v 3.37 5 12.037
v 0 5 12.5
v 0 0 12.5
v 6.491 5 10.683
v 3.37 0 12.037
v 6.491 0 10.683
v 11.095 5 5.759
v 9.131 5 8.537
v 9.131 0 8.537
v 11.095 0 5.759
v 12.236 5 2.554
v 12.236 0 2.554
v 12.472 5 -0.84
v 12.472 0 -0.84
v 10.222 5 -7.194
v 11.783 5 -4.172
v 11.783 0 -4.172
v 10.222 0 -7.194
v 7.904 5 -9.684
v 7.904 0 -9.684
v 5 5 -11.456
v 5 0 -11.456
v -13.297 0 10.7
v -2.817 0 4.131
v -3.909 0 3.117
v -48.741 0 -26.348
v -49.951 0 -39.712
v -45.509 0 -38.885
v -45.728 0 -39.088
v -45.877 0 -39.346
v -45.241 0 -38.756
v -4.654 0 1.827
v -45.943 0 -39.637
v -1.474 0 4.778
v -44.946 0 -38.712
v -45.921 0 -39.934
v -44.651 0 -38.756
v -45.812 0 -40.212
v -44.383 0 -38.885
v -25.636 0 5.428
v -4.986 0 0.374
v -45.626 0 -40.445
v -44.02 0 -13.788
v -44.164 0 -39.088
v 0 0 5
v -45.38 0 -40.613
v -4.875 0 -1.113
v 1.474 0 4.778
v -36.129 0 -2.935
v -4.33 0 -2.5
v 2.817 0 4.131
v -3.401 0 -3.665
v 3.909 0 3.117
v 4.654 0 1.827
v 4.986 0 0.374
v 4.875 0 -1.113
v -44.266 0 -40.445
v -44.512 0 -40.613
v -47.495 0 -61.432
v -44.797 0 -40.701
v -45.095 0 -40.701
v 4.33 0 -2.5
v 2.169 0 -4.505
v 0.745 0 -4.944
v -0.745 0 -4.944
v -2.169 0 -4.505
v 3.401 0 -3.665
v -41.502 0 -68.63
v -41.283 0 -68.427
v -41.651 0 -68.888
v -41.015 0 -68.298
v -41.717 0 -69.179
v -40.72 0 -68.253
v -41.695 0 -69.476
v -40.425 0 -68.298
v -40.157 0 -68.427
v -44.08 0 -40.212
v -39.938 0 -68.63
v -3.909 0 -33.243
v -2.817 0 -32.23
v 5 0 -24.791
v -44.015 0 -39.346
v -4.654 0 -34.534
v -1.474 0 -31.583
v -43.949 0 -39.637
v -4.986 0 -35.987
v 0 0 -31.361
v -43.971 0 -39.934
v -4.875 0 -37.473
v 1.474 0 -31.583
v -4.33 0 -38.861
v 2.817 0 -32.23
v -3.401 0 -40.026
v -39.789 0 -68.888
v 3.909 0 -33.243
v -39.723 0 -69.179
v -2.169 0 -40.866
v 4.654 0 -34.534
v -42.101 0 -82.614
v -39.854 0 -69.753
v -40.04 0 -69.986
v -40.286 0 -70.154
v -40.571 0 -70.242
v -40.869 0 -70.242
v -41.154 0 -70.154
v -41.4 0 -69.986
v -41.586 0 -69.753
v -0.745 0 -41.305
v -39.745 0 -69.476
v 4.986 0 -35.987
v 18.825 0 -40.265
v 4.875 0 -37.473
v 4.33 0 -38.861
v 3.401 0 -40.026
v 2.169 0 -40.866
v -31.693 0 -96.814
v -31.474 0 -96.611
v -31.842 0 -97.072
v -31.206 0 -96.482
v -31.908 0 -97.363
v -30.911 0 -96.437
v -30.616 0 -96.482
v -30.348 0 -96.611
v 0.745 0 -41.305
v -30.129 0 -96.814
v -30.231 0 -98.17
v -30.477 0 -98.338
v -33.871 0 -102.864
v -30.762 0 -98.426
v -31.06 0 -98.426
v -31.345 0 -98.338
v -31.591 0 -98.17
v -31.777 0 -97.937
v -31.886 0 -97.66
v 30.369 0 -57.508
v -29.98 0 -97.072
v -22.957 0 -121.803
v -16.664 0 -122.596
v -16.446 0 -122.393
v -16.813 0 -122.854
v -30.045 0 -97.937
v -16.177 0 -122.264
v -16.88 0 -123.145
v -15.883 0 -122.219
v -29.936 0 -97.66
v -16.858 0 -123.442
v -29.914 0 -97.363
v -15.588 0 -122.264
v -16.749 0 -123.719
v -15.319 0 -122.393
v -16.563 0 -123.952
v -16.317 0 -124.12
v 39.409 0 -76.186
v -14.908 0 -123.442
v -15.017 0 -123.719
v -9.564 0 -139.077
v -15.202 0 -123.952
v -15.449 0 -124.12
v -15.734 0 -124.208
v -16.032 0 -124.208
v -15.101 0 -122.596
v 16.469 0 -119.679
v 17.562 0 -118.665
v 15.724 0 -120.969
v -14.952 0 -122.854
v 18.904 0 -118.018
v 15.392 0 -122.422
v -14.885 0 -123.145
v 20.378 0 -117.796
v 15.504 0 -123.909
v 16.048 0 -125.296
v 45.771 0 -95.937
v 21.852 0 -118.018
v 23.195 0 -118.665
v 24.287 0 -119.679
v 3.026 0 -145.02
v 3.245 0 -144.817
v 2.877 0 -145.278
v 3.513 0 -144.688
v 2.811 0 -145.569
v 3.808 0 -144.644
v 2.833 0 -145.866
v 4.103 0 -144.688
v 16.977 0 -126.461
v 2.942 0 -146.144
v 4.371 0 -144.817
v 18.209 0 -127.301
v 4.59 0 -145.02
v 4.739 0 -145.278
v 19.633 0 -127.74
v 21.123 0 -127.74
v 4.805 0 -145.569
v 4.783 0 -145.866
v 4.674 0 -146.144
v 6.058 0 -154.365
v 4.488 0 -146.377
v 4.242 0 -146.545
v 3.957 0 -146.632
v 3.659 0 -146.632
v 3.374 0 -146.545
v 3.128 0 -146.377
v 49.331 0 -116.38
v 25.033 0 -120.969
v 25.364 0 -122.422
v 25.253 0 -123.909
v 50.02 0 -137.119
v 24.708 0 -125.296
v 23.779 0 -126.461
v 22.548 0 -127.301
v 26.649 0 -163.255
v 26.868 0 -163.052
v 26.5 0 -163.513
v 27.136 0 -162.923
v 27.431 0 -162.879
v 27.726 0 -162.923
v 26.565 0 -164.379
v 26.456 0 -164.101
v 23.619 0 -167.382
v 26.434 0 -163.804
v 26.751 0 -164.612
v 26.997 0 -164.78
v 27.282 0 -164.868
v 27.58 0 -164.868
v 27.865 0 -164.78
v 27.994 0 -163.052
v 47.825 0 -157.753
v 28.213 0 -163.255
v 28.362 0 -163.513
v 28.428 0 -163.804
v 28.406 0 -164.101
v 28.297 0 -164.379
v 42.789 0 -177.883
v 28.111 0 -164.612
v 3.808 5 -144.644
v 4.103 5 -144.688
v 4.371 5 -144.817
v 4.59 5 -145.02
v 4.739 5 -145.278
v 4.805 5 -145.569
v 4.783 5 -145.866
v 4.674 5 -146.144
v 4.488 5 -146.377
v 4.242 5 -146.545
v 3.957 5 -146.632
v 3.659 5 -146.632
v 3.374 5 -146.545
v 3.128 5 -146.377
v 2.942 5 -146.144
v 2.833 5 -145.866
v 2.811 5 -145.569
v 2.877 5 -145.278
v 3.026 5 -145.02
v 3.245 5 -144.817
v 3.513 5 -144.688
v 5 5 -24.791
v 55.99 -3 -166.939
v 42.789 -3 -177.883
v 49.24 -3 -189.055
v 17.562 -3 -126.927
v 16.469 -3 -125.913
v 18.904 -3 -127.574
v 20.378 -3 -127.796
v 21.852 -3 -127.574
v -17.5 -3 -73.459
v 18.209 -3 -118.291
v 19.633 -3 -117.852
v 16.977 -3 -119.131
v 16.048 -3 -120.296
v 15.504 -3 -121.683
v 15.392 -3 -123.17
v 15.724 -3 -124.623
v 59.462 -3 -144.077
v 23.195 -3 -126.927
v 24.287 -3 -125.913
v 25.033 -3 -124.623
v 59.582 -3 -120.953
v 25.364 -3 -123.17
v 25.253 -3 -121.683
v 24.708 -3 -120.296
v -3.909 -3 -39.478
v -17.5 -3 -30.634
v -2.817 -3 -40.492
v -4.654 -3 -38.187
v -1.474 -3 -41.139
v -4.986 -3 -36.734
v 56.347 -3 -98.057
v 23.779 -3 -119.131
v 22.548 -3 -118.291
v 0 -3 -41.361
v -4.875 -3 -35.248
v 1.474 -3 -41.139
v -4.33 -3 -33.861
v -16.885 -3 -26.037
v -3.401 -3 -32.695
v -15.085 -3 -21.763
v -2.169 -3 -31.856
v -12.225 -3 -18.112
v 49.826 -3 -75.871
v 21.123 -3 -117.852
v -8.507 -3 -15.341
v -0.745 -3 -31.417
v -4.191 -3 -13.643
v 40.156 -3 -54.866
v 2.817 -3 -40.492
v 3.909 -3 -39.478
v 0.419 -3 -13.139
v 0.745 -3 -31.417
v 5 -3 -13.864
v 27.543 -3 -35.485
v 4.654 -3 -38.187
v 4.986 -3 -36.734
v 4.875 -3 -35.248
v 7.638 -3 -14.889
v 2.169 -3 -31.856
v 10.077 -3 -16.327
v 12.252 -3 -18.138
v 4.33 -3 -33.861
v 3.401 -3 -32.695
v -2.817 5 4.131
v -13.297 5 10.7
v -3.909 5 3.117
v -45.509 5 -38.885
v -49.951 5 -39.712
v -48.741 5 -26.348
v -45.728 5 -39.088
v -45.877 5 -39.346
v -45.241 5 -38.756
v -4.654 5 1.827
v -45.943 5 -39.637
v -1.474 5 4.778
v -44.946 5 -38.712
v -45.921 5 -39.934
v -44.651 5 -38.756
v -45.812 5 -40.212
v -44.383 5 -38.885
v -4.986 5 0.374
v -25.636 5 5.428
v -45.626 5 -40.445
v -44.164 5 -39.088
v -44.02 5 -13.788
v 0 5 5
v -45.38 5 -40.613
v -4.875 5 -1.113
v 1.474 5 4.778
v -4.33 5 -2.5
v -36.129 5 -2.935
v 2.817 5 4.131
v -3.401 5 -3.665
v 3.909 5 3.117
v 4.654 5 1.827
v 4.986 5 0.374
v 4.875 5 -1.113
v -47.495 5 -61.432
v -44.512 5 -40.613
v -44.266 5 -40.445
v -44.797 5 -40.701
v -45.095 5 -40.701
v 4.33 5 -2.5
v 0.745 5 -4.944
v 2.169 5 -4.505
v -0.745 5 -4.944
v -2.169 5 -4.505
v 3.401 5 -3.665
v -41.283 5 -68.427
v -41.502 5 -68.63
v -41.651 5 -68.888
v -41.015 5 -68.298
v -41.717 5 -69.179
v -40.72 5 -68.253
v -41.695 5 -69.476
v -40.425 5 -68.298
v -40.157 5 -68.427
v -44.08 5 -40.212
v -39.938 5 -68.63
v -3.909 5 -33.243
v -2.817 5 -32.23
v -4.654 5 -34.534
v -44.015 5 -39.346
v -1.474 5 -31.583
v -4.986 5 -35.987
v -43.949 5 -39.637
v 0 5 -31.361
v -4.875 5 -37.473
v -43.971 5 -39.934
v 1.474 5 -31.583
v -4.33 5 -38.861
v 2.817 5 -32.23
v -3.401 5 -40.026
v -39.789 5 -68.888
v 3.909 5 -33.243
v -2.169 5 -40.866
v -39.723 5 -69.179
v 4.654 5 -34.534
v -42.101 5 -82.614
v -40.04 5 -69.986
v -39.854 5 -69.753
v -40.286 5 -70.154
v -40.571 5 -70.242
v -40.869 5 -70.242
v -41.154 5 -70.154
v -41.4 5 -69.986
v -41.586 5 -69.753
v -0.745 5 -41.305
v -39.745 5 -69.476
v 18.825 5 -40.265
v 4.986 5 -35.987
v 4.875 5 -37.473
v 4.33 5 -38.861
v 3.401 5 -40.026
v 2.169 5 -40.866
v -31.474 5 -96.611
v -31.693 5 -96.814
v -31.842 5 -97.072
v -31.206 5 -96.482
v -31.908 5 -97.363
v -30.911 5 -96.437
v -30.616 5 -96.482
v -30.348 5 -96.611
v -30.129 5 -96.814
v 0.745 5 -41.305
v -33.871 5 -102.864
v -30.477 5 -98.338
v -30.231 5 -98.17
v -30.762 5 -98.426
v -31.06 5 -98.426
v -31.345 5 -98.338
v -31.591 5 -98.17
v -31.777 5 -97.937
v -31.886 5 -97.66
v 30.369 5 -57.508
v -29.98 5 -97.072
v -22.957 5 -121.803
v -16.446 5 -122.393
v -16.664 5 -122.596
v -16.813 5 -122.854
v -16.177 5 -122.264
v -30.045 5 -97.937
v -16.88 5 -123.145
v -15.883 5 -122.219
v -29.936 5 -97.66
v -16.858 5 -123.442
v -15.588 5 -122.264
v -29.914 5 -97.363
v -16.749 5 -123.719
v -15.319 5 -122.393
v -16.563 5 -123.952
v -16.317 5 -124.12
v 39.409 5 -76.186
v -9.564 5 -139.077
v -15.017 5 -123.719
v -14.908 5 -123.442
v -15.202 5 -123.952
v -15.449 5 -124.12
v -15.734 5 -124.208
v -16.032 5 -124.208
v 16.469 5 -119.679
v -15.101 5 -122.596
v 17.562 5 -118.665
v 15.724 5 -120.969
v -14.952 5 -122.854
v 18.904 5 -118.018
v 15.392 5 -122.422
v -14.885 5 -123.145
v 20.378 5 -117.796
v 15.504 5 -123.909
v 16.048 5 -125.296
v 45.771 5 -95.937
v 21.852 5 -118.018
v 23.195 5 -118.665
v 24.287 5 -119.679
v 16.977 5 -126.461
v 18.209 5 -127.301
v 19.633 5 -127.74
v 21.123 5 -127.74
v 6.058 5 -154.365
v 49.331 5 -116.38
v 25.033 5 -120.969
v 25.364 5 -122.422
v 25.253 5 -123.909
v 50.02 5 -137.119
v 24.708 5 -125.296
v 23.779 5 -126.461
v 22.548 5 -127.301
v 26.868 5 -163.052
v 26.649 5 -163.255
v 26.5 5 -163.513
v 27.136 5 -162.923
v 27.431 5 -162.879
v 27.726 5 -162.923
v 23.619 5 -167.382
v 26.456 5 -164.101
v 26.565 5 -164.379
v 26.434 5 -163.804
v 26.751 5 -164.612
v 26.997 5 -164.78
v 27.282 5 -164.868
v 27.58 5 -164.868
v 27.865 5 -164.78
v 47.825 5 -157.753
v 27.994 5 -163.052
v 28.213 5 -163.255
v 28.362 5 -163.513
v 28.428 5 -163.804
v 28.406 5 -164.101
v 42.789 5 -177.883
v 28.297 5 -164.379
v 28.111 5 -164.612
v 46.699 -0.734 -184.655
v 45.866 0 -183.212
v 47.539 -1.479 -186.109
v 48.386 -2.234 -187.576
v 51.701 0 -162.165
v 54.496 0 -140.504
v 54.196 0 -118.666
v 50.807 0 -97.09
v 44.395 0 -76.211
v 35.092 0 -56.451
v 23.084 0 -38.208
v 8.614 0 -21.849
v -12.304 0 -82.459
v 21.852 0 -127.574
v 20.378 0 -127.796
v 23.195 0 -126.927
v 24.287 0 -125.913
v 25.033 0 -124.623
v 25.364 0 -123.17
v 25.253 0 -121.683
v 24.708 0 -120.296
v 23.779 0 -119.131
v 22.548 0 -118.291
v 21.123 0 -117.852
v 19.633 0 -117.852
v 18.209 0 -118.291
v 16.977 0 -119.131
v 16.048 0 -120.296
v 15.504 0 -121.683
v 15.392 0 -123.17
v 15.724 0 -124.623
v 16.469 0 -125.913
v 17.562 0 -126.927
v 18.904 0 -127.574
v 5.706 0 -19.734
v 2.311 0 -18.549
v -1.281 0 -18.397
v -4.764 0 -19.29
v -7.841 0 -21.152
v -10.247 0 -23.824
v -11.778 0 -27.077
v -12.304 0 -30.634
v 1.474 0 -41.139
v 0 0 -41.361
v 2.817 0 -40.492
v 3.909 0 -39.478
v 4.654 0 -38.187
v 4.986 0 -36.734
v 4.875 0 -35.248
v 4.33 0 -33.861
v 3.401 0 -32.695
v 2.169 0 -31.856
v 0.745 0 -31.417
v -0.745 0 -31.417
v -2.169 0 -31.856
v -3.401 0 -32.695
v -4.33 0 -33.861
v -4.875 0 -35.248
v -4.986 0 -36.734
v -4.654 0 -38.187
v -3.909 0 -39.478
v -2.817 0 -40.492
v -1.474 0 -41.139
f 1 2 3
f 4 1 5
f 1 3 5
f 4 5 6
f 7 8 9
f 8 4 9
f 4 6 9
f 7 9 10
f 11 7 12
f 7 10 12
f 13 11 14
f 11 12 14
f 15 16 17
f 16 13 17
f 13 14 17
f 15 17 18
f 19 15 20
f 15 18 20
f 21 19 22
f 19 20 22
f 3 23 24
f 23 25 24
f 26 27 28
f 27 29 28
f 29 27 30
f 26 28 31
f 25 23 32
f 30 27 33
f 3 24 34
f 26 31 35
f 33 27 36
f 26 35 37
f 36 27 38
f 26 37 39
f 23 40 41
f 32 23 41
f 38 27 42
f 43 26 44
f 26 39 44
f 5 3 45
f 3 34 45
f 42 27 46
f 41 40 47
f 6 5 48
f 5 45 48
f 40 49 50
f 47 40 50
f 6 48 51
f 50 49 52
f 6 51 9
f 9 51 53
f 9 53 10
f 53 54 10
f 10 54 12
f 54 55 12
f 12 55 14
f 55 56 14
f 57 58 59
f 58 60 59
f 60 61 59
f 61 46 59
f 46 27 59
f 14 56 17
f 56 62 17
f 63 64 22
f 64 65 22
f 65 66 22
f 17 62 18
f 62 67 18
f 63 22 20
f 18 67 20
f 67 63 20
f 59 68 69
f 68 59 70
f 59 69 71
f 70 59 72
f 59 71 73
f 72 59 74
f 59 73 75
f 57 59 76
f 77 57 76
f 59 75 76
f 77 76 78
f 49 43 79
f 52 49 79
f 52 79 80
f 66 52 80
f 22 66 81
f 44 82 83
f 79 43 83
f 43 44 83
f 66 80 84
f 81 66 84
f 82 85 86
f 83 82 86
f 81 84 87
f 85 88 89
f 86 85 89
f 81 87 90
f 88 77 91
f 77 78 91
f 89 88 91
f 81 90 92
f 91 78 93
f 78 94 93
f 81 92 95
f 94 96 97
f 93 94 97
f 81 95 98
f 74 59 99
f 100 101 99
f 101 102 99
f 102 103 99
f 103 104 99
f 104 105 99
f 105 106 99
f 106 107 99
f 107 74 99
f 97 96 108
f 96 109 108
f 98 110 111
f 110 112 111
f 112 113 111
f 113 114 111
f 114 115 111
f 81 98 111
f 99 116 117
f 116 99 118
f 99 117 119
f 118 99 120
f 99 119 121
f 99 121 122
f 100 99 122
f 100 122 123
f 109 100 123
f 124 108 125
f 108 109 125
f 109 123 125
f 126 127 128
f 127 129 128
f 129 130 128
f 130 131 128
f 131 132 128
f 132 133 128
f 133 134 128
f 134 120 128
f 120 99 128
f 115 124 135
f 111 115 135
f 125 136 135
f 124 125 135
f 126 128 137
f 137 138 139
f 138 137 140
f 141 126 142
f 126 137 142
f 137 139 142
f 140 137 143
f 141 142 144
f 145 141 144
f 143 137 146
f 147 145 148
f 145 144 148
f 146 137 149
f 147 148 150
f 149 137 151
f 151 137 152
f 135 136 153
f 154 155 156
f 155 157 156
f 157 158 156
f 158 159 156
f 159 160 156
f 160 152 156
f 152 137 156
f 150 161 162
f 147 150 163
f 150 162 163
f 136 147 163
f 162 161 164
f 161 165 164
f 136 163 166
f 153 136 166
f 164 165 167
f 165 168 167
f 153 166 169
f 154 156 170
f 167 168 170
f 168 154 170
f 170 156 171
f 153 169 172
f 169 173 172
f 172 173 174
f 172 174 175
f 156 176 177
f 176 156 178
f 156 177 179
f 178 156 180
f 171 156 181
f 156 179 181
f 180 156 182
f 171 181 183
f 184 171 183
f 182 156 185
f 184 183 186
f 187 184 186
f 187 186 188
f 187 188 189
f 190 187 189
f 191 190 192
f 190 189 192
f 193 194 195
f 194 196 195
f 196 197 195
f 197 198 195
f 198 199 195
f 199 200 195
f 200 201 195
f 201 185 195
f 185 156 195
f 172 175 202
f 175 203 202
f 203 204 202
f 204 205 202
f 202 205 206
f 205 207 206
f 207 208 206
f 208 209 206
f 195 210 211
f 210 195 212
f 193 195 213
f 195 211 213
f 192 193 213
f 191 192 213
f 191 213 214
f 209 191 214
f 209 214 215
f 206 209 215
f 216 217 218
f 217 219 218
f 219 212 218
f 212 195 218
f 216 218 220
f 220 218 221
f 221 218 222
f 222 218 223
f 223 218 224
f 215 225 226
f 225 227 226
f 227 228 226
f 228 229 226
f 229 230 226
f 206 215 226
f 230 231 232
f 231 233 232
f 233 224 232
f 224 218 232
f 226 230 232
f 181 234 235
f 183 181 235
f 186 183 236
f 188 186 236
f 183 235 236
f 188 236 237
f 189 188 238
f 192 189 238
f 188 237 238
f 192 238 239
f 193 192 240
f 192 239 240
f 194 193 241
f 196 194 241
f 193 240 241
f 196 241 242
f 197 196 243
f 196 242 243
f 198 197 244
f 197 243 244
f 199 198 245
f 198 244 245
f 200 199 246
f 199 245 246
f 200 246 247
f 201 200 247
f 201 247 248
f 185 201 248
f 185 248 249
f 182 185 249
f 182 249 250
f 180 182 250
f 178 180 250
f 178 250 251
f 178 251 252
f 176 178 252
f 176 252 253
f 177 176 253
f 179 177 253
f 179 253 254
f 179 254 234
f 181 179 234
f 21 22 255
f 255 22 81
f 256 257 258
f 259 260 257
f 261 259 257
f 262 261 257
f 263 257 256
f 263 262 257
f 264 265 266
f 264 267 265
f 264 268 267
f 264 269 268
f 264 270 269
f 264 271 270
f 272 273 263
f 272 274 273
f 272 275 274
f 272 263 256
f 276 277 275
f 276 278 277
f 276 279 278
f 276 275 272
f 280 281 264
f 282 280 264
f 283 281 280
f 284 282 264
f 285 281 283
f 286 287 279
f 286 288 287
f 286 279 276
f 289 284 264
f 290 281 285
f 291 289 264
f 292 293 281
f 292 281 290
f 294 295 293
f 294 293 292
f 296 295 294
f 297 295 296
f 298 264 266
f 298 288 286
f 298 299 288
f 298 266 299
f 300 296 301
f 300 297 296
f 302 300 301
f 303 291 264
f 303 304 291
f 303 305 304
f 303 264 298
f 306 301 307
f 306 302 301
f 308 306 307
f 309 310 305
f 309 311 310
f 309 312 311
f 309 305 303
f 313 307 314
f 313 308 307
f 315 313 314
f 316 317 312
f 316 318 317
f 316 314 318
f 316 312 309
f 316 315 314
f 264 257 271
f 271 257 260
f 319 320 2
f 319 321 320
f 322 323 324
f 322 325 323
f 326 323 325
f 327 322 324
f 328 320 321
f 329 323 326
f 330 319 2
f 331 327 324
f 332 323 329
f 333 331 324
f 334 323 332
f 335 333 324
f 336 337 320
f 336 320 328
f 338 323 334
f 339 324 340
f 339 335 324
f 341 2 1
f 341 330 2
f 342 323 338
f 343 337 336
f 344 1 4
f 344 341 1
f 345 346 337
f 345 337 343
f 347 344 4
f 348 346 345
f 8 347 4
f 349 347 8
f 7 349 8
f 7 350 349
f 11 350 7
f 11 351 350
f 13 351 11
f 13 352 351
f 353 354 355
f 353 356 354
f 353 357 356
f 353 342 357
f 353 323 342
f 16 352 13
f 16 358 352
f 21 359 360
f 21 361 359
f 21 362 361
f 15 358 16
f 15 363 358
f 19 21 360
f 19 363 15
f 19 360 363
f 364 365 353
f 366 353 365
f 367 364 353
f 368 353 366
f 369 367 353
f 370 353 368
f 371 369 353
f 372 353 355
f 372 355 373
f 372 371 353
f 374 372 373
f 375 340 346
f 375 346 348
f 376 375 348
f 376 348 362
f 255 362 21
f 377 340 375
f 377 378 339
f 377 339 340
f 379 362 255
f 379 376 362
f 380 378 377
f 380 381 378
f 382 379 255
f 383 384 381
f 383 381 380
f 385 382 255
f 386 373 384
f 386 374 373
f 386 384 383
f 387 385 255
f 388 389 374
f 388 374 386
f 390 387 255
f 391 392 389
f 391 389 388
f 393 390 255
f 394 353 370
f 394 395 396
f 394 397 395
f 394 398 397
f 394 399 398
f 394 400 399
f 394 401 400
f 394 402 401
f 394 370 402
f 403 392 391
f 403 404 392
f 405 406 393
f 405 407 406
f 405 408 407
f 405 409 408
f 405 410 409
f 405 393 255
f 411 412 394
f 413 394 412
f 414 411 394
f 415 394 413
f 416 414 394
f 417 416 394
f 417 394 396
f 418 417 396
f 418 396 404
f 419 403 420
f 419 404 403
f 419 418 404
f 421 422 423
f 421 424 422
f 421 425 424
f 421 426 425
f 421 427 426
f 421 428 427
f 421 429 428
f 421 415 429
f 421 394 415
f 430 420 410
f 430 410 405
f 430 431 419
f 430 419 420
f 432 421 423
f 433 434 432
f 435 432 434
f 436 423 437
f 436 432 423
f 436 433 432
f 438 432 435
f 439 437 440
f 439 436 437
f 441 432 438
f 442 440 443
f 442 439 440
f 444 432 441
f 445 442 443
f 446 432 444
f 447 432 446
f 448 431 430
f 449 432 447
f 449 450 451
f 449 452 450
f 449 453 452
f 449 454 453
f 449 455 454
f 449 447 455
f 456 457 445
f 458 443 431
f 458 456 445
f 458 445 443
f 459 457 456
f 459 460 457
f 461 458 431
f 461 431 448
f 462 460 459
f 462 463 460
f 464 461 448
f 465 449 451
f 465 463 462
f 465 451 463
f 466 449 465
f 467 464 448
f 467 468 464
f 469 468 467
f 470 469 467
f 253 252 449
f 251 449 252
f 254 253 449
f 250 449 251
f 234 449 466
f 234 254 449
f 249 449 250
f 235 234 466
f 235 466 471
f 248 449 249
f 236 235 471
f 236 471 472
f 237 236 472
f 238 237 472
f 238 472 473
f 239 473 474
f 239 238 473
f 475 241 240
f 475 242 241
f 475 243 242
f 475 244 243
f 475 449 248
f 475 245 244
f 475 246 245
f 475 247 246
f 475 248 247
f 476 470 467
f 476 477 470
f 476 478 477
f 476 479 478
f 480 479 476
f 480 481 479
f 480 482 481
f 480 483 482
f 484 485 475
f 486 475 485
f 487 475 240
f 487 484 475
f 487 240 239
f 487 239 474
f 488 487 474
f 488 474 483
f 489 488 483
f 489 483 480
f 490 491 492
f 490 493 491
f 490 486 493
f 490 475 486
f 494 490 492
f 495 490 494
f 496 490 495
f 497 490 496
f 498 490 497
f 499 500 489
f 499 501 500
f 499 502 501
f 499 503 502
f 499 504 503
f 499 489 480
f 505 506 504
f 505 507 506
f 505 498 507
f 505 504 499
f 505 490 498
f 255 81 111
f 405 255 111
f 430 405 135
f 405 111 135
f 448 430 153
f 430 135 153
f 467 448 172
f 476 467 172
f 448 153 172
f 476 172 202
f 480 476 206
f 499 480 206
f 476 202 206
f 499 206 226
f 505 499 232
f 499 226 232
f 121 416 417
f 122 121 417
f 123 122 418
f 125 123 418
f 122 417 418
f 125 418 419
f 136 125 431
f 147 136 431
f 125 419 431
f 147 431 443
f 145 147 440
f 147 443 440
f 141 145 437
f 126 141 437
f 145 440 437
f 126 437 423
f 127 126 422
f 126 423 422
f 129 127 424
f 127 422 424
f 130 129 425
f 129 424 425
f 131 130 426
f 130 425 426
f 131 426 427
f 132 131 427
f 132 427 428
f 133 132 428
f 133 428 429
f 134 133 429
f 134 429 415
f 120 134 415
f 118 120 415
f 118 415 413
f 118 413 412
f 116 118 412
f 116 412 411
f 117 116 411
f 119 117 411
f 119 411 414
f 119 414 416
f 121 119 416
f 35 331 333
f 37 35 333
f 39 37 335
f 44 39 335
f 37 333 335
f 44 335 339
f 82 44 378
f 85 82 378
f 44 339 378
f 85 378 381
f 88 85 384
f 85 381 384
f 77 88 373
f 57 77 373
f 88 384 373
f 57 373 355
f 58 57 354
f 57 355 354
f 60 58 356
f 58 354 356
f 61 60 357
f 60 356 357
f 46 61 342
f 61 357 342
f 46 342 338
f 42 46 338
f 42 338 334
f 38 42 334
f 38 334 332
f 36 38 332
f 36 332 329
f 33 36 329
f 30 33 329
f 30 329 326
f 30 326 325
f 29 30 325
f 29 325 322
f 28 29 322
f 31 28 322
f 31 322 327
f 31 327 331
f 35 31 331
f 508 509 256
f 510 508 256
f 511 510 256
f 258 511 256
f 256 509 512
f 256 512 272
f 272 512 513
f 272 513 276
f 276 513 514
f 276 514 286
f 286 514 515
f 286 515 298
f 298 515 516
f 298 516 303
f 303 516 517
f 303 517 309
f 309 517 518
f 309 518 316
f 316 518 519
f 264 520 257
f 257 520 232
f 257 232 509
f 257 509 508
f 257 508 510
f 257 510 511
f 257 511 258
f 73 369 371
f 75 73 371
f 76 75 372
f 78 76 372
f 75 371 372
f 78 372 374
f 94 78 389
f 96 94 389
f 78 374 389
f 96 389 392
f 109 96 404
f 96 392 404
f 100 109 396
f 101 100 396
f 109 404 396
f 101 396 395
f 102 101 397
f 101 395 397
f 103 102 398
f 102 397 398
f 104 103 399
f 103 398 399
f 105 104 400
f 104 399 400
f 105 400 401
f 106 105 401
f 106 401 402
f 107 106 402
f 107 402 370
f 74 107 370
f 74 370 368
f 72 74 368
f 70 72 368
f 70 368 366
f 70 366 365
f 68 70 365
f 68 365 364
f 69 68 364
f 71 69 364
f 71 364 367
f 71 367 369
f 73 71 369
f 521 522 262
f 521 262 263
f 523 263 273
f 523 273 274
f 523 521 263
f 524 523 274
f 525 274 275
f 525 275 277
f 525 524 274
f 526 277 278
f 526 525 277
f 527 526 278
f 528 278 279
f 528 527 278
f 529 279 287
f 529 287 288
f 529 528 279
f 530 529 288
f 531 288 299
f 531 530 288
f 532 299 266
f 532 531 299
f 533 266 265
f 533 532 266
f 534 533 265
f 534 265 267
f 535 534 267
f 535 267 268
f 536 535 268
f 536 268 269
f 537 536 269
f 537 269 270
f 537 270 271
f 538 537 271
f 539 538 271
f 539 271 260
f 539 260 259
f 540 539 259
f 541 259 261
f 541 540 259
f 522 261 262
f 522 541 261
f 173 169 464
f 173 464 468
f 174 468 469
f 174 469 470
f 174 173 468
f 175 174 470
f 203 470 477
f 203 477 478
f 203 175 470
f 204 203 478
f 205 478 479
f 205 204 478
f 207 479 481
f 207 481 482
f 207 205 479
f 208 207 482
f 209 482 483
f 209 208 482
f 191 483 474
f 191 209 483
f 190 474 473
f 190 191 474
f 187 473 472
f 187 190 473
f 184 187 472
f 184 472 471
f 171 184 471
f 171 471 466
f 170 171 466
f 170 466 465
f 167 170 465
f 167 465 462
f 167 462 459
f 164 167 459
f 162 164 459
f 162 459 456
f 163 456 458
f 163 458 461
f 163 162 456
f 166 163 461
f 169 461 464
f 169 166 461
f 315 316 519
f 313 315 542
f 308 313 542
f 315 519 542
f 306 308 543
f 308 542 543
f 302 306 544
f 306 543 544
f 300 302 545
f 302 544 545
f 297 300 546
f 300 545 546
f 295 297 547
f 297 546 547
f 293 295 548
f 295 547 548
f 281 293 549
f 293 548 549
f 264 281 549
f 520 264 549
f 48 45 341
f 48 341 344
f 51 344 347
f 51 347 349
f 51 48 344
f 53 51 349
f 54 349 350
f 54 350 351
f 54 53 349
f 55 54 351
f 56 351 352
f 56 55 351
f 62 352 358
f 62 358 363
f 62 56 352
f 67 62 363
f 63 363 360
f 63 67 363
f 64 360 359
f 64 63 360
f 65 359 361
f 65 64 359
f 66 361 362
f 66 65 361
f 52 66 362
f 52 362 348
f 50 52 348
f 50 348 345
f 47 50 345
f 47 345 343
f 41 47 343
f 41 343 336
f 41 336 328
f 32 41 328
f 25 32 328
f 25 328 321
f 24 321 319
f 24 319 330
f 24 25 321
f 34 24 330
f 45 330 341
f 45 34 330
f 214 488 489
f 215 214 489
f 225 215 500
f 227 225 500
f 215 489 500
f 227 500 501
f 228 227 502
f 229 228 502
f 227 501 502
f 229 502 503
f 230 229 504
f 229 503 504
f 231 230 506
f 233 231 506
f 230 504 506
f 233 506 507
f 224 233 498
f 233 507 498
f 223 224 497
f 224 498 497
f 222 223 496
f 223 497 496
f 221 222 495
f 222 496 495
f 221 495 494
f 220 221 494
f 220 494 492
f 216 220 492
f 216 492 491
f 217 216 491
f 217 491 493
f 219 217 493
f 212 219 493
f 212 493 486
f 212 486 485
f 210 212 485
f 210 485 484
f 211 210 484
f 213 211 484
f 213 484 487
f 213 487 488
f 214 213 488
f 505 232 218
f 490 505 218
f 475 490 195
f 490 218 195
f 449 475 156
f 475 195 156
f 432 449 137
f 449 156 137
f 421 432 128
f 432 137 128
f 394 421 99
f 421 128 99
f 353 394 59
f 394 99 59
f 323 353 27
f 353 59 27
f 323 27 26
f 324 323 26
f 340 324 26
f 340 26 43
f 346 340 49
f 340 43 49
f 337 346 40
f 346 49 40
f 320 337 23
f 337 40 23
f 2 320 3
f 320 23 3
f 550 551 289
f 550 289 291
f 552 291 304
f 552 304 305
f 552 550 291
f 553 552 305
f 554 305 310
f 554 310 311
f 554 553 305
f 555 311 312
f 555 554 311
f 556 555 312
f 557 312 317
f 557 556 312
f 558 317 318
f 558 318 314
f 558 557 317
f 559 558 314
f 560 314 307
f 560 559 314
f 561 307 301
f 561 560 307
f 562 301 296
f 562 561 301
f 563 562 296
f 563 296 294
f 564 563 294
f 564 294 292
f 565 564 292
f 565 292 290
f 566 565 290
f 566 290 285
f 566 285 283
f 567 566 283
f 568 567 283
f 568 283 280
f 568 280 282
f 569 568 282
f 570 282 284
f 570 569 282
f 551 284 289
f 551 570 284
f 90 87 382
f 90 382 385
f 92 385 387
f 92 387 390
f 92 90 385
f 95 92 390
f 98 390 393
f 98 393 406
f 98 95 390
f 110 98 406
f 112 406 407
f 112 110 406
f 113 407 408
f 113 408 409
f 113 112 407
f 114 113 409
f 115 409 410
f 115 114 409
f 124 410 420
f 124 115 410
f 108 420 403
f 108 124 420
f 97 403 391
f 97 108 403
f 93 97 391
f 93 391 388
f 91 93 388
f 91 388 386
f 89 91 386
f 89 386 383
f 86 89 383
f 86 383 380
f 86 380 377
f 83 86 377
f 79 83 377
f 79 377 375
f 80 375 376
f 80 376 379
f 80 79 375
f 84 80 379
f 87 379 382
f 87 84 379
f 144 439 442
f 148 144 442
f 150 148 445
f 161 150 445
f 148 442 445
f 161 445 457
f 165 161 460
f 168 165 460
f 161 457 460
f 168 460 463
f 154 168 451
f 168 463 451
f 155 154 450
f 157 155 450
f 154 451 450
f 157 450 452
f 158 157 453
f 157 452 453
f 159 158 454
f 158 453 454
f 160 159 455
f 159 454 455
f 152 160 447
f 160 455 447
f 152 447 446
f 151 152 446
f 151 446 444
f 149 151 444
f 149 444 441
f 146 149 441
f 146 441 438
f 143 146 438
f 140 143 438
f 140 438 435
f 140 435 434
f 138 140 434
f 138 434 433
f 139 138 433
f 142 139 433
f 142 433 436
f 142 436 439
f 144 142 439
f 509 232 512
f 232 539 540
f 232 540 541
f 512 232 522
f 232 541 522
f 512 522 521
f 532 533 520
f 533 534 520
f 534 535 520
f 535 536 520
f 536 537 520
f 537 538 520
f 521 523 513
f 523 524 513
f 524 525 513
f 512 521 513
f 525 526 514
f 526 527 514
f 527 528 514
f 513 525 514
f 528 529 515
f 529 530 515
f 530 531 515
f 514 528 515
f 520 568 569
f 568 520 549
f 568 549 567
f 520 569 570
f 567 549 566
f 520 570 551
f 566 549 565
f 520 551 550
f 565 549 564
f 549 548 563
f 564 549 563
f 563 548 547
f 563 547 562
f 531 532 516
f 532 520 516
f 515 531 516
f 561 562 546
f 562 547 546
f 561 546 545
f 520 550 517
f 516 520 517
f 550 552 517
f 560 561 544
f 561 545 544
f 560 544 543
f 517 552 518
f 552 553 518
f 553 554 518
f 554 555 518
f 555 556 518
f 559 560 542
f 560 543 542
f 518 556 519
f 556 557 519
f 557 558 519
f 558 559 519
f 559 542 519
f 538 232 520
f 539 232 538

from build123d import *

# Parameters (mm, degrees)
IZIM1_R                     = 5
IZIM1_R_2                   = 12.5
Y_KSEKLIK_EKSTR_ZYON1_DEPTH = 5
IZIM2_R                     = 5
BLADE_DEPTH                 = 3
PAH1_SIZE                   = 3
PAH1_SIZE_2                 = 5.196152423
IZIM3_R                     = 1
KANCA_DELIKLERI_DEPTH       = 199.49265783


with BuildPart() as part:
    # Çizim1 → Yükseklik-Ekstrüzyon1 (new body)
    # profile 1 of 2: a face of its own
    with BuildSketch(Plane(origin=(0, 0, 0), x_dir=(1, 0, 0), z_dir=(0, 1, 0))):
        with BuildLine():
            Line((5, 11.456439237), (5, 24.791036465))
            ThreePointArc((5, 24.791036465), (45.770978253, 95.93703242), (42.789260889, 177.882958308))
            ThreePointArc((42.789260889, 177.882958308), (-22.95720379, 121.802666414), (-49.951060338, 39.711689653))
            ThreePointArc((-49.951060338, 39.711689653), (-36.128828397, 2.935455179), (0, -12.5))
            ThreePointArc((0, -12.5), (-12.236328912, 2.553870546), (5, 11.456439237))
        make_face()
        with Locations(Location((0, 36.360727505, 0), (0, 0, 270))):
            Circle(IZIM1_R, mode=Mode.SUBTRACT)
        with Locations(Location((20.378166684, 122.796020062, 0), (0, 0, 270))):
            Circle(IZIM1_R, mode=Mode.SUBTRACT)
    # profile 2 of 2: a face of its own
    with BuildSketch(Plane(origin=(0, 0, 0), x_dir=(1, 0, 0), z_dir=(0, 1, 0))):
        Circle(IZIM1_R_2)
        with Locations(Location((0, 0, 0), (0, 0, 270))):
            Circle(IZIM1_R, mode=Mode.SUBTRACT)
    extrude(amount=Y_KSEKLIK_EKSTR_ZYON1_DEPTH)

    # Çizim3 → kanca delikleri (cut, through all)
    with BuildSketch(Plane(origin=(0, 5, 0), x_dir=(1, 0, 0), z_dir=(0, 1, 0))):
        with Locations(Location((27.43084459, 163.878722536, 0), (0, 0, 270))):
            Circle(IZIM3_R)
        with Locations(Location((3.807935712, 145.643577542, 0), (0, 0, 270))):
            Circle(IZIM3_R)
        with Locations(Location((-15.882620678, 123.219386901, 0), (0, 0, 270))):
            Circle(IZIM3_R)
        with Locations(Location((-30.910932055, 97.437373908, 0), (0, 0, 270))):
            Circle(IZIM3_R)
        with Locations(Location((-40.719926699, 69.253230123, 0), (0, 0, 270))):
            Circle(IZIM3_R)
        with Locations(Location((-44.94600331, 39.711689653, 0), (0, 0, 270))):
            Circle(IZIM3_R)
    extrude(amount=-KANCA_DELIKLERI_DEPTH, mode=Mode.SUBTRACT)


with BuildPart() as body_2:
    # Çizim2 → blade (new body)
    # profile 1 of 4: a face of its own
    with BuildSketch(Plane.XZ):
        with BuildLine():
            ThreePointArc((-17.5, -30.634192166), (-3.274683301, -47.825074903), (16.274451346, -37.067871781))
            ThreePointArc((16.274451346, -37.067871781), (10.808797948, -30.77189045), (5, -24.791036465))
            Line((5, -24.791036465), (5, -13.863682335))
            ThreePointArc((5, -13.863682335), (-10.458250332, -16.602976965), (-17.5, -30.634192166))
        make_face()
        with Locations(Location((0, -36.360727505, 0), (0, 0, 270))):
            Circle(IZIM2_R, mode=Mode.SUBTRACT)
    # profile 2 of 4: a face of its own
    with BuildSketch(Plane.XZ):
        with BuildLine():
            Line((-17.5, -73.458895297), (42.789260889, -177.882958308))
            ThreePointArc((42.789260889, -177.882958308), (47.54208487, -104.084174823), (16.274451346, -37.067871781))
            ThreePointArc((16.274451346, -37.067871781), (-3.274683301, -47.825074903), (-17.5, -30.634192166))
            Line((-17.5, -30.634192166), (-17.5, -73.458895297))
        make_face()
        with Locations(Location((20.378166684, -122.796020062, 0), (0, 0, 270))):
            Circle(IZIM2_R, mode=Mode.SUBTRACT)
    # profile 3 of 4: a face of its own
    with BuildSketch(Plane.XZ):
        with BuildLine():
            Line((42.789260889, -177.882958308), (49.239635028, -189.055334043))
            ThreePointArc((49.239635028, -189.055334043), (56.347089994, -98.056501036), (12.251738073, -18.138396305))
            ThreePointArc((12.251738073, -18.138396305), (16.134674095, -23.857593324), (17.5, -30.634192166))
            ThreePointArc((17.5, -30.634192166), (17.190882737, -33.908875467), (16.274451346, -37.067871781))
            ThreePointArc((16.274451346, -37.067871781), (47.54208487, -104.084174823), (42.789260889, -177.882958308))
        make_face()
    # profile 4 of 4: a face of its own
    with BuildSketch(Plane.XZ):
        with BuildLine():
            ThreePointArc((17.5, -30.634192166), (16.134674095, -23.857593324), (12.251738073, -18.138396305))
            ThreePointArc((12.251738073, -18.138396305), (8.886726704, -15.558513459), (5, -13.863682335))
            Line((5, -13.863682335), (5, -24.791036465))
            ThreePointArc((5, -24.791036465), (10.808797948, -30.77189045), (16.274451346, -37.067871781))
            ThreePointArc((16.274451346, -37.067871781), (17.190882737, -33.908875467), (17.5, -30.634192166))
        make_face()
    extrude(amount=BLADE_DEPTH)

    # Pah1
    # the kernel refuses this chamfer: 5.196152423, 3 mm, written as the material it takes off along each edge
    with BuildSketch(Plane(origin=(-17.5, 0, -30.634192166), x_dir=(-0.05789386240267091, -0.9983227437537926, 0), z_dir=(0, 0, -1))) as pah1_piece_1:
        Polygon((PAH1_SIZE * 0.998322743754, -PAH1_SIZE * 0.0578938624027), (-PAH1_SIZE_2 * 0.0578938623994, -PAH1_SIZE_2 * 0.998322743697), (0, 0), align=None)
    extrude(amount=56.267595043, mode=Mode.SUBTRACT)
    with BuildSketch(Plane(origin=(0, 0, -30.634192166), x_dir=(0.7000993184445534, 0, 0.7140454777627765), z_dir=(0.7140454777627765, 0, -0.7000993184445534))) as pah1_piece_2:
        Polygon((17.5, PAH1_SIZE), (17.5 - PAH1_SIZE_2, 0), (17.5, 0), align=None)
    revolve(axis=Axis((0, 0, -30.634192166), (0, -1, 0)), revolution_arc=134.434972877, mode=Mode.SUBTRACT)
    with BuildSketch(Plane(origin=(-99.085438878, 0, -131.693438588), x_dir=(0.8988910106587495, 0, -0.43817228456041324), z_dir=(-0.43817228456041324, 0, -0.8988910106587495))) as pah1_piece_3:
        Polygon((159.03054612, PAH1_SIZE), (159.03054612 - PAH1_SIZE_2, 0), (159.03054612, 0), align=None)
    revolve(axis=Axis((-99.085438878, 0, -131.693438588), (0, -1, 0)), revolution_arc=71.552350858, mode=Mode.SUBTRACT)


solid = Compound([part.part, body_2.part])
